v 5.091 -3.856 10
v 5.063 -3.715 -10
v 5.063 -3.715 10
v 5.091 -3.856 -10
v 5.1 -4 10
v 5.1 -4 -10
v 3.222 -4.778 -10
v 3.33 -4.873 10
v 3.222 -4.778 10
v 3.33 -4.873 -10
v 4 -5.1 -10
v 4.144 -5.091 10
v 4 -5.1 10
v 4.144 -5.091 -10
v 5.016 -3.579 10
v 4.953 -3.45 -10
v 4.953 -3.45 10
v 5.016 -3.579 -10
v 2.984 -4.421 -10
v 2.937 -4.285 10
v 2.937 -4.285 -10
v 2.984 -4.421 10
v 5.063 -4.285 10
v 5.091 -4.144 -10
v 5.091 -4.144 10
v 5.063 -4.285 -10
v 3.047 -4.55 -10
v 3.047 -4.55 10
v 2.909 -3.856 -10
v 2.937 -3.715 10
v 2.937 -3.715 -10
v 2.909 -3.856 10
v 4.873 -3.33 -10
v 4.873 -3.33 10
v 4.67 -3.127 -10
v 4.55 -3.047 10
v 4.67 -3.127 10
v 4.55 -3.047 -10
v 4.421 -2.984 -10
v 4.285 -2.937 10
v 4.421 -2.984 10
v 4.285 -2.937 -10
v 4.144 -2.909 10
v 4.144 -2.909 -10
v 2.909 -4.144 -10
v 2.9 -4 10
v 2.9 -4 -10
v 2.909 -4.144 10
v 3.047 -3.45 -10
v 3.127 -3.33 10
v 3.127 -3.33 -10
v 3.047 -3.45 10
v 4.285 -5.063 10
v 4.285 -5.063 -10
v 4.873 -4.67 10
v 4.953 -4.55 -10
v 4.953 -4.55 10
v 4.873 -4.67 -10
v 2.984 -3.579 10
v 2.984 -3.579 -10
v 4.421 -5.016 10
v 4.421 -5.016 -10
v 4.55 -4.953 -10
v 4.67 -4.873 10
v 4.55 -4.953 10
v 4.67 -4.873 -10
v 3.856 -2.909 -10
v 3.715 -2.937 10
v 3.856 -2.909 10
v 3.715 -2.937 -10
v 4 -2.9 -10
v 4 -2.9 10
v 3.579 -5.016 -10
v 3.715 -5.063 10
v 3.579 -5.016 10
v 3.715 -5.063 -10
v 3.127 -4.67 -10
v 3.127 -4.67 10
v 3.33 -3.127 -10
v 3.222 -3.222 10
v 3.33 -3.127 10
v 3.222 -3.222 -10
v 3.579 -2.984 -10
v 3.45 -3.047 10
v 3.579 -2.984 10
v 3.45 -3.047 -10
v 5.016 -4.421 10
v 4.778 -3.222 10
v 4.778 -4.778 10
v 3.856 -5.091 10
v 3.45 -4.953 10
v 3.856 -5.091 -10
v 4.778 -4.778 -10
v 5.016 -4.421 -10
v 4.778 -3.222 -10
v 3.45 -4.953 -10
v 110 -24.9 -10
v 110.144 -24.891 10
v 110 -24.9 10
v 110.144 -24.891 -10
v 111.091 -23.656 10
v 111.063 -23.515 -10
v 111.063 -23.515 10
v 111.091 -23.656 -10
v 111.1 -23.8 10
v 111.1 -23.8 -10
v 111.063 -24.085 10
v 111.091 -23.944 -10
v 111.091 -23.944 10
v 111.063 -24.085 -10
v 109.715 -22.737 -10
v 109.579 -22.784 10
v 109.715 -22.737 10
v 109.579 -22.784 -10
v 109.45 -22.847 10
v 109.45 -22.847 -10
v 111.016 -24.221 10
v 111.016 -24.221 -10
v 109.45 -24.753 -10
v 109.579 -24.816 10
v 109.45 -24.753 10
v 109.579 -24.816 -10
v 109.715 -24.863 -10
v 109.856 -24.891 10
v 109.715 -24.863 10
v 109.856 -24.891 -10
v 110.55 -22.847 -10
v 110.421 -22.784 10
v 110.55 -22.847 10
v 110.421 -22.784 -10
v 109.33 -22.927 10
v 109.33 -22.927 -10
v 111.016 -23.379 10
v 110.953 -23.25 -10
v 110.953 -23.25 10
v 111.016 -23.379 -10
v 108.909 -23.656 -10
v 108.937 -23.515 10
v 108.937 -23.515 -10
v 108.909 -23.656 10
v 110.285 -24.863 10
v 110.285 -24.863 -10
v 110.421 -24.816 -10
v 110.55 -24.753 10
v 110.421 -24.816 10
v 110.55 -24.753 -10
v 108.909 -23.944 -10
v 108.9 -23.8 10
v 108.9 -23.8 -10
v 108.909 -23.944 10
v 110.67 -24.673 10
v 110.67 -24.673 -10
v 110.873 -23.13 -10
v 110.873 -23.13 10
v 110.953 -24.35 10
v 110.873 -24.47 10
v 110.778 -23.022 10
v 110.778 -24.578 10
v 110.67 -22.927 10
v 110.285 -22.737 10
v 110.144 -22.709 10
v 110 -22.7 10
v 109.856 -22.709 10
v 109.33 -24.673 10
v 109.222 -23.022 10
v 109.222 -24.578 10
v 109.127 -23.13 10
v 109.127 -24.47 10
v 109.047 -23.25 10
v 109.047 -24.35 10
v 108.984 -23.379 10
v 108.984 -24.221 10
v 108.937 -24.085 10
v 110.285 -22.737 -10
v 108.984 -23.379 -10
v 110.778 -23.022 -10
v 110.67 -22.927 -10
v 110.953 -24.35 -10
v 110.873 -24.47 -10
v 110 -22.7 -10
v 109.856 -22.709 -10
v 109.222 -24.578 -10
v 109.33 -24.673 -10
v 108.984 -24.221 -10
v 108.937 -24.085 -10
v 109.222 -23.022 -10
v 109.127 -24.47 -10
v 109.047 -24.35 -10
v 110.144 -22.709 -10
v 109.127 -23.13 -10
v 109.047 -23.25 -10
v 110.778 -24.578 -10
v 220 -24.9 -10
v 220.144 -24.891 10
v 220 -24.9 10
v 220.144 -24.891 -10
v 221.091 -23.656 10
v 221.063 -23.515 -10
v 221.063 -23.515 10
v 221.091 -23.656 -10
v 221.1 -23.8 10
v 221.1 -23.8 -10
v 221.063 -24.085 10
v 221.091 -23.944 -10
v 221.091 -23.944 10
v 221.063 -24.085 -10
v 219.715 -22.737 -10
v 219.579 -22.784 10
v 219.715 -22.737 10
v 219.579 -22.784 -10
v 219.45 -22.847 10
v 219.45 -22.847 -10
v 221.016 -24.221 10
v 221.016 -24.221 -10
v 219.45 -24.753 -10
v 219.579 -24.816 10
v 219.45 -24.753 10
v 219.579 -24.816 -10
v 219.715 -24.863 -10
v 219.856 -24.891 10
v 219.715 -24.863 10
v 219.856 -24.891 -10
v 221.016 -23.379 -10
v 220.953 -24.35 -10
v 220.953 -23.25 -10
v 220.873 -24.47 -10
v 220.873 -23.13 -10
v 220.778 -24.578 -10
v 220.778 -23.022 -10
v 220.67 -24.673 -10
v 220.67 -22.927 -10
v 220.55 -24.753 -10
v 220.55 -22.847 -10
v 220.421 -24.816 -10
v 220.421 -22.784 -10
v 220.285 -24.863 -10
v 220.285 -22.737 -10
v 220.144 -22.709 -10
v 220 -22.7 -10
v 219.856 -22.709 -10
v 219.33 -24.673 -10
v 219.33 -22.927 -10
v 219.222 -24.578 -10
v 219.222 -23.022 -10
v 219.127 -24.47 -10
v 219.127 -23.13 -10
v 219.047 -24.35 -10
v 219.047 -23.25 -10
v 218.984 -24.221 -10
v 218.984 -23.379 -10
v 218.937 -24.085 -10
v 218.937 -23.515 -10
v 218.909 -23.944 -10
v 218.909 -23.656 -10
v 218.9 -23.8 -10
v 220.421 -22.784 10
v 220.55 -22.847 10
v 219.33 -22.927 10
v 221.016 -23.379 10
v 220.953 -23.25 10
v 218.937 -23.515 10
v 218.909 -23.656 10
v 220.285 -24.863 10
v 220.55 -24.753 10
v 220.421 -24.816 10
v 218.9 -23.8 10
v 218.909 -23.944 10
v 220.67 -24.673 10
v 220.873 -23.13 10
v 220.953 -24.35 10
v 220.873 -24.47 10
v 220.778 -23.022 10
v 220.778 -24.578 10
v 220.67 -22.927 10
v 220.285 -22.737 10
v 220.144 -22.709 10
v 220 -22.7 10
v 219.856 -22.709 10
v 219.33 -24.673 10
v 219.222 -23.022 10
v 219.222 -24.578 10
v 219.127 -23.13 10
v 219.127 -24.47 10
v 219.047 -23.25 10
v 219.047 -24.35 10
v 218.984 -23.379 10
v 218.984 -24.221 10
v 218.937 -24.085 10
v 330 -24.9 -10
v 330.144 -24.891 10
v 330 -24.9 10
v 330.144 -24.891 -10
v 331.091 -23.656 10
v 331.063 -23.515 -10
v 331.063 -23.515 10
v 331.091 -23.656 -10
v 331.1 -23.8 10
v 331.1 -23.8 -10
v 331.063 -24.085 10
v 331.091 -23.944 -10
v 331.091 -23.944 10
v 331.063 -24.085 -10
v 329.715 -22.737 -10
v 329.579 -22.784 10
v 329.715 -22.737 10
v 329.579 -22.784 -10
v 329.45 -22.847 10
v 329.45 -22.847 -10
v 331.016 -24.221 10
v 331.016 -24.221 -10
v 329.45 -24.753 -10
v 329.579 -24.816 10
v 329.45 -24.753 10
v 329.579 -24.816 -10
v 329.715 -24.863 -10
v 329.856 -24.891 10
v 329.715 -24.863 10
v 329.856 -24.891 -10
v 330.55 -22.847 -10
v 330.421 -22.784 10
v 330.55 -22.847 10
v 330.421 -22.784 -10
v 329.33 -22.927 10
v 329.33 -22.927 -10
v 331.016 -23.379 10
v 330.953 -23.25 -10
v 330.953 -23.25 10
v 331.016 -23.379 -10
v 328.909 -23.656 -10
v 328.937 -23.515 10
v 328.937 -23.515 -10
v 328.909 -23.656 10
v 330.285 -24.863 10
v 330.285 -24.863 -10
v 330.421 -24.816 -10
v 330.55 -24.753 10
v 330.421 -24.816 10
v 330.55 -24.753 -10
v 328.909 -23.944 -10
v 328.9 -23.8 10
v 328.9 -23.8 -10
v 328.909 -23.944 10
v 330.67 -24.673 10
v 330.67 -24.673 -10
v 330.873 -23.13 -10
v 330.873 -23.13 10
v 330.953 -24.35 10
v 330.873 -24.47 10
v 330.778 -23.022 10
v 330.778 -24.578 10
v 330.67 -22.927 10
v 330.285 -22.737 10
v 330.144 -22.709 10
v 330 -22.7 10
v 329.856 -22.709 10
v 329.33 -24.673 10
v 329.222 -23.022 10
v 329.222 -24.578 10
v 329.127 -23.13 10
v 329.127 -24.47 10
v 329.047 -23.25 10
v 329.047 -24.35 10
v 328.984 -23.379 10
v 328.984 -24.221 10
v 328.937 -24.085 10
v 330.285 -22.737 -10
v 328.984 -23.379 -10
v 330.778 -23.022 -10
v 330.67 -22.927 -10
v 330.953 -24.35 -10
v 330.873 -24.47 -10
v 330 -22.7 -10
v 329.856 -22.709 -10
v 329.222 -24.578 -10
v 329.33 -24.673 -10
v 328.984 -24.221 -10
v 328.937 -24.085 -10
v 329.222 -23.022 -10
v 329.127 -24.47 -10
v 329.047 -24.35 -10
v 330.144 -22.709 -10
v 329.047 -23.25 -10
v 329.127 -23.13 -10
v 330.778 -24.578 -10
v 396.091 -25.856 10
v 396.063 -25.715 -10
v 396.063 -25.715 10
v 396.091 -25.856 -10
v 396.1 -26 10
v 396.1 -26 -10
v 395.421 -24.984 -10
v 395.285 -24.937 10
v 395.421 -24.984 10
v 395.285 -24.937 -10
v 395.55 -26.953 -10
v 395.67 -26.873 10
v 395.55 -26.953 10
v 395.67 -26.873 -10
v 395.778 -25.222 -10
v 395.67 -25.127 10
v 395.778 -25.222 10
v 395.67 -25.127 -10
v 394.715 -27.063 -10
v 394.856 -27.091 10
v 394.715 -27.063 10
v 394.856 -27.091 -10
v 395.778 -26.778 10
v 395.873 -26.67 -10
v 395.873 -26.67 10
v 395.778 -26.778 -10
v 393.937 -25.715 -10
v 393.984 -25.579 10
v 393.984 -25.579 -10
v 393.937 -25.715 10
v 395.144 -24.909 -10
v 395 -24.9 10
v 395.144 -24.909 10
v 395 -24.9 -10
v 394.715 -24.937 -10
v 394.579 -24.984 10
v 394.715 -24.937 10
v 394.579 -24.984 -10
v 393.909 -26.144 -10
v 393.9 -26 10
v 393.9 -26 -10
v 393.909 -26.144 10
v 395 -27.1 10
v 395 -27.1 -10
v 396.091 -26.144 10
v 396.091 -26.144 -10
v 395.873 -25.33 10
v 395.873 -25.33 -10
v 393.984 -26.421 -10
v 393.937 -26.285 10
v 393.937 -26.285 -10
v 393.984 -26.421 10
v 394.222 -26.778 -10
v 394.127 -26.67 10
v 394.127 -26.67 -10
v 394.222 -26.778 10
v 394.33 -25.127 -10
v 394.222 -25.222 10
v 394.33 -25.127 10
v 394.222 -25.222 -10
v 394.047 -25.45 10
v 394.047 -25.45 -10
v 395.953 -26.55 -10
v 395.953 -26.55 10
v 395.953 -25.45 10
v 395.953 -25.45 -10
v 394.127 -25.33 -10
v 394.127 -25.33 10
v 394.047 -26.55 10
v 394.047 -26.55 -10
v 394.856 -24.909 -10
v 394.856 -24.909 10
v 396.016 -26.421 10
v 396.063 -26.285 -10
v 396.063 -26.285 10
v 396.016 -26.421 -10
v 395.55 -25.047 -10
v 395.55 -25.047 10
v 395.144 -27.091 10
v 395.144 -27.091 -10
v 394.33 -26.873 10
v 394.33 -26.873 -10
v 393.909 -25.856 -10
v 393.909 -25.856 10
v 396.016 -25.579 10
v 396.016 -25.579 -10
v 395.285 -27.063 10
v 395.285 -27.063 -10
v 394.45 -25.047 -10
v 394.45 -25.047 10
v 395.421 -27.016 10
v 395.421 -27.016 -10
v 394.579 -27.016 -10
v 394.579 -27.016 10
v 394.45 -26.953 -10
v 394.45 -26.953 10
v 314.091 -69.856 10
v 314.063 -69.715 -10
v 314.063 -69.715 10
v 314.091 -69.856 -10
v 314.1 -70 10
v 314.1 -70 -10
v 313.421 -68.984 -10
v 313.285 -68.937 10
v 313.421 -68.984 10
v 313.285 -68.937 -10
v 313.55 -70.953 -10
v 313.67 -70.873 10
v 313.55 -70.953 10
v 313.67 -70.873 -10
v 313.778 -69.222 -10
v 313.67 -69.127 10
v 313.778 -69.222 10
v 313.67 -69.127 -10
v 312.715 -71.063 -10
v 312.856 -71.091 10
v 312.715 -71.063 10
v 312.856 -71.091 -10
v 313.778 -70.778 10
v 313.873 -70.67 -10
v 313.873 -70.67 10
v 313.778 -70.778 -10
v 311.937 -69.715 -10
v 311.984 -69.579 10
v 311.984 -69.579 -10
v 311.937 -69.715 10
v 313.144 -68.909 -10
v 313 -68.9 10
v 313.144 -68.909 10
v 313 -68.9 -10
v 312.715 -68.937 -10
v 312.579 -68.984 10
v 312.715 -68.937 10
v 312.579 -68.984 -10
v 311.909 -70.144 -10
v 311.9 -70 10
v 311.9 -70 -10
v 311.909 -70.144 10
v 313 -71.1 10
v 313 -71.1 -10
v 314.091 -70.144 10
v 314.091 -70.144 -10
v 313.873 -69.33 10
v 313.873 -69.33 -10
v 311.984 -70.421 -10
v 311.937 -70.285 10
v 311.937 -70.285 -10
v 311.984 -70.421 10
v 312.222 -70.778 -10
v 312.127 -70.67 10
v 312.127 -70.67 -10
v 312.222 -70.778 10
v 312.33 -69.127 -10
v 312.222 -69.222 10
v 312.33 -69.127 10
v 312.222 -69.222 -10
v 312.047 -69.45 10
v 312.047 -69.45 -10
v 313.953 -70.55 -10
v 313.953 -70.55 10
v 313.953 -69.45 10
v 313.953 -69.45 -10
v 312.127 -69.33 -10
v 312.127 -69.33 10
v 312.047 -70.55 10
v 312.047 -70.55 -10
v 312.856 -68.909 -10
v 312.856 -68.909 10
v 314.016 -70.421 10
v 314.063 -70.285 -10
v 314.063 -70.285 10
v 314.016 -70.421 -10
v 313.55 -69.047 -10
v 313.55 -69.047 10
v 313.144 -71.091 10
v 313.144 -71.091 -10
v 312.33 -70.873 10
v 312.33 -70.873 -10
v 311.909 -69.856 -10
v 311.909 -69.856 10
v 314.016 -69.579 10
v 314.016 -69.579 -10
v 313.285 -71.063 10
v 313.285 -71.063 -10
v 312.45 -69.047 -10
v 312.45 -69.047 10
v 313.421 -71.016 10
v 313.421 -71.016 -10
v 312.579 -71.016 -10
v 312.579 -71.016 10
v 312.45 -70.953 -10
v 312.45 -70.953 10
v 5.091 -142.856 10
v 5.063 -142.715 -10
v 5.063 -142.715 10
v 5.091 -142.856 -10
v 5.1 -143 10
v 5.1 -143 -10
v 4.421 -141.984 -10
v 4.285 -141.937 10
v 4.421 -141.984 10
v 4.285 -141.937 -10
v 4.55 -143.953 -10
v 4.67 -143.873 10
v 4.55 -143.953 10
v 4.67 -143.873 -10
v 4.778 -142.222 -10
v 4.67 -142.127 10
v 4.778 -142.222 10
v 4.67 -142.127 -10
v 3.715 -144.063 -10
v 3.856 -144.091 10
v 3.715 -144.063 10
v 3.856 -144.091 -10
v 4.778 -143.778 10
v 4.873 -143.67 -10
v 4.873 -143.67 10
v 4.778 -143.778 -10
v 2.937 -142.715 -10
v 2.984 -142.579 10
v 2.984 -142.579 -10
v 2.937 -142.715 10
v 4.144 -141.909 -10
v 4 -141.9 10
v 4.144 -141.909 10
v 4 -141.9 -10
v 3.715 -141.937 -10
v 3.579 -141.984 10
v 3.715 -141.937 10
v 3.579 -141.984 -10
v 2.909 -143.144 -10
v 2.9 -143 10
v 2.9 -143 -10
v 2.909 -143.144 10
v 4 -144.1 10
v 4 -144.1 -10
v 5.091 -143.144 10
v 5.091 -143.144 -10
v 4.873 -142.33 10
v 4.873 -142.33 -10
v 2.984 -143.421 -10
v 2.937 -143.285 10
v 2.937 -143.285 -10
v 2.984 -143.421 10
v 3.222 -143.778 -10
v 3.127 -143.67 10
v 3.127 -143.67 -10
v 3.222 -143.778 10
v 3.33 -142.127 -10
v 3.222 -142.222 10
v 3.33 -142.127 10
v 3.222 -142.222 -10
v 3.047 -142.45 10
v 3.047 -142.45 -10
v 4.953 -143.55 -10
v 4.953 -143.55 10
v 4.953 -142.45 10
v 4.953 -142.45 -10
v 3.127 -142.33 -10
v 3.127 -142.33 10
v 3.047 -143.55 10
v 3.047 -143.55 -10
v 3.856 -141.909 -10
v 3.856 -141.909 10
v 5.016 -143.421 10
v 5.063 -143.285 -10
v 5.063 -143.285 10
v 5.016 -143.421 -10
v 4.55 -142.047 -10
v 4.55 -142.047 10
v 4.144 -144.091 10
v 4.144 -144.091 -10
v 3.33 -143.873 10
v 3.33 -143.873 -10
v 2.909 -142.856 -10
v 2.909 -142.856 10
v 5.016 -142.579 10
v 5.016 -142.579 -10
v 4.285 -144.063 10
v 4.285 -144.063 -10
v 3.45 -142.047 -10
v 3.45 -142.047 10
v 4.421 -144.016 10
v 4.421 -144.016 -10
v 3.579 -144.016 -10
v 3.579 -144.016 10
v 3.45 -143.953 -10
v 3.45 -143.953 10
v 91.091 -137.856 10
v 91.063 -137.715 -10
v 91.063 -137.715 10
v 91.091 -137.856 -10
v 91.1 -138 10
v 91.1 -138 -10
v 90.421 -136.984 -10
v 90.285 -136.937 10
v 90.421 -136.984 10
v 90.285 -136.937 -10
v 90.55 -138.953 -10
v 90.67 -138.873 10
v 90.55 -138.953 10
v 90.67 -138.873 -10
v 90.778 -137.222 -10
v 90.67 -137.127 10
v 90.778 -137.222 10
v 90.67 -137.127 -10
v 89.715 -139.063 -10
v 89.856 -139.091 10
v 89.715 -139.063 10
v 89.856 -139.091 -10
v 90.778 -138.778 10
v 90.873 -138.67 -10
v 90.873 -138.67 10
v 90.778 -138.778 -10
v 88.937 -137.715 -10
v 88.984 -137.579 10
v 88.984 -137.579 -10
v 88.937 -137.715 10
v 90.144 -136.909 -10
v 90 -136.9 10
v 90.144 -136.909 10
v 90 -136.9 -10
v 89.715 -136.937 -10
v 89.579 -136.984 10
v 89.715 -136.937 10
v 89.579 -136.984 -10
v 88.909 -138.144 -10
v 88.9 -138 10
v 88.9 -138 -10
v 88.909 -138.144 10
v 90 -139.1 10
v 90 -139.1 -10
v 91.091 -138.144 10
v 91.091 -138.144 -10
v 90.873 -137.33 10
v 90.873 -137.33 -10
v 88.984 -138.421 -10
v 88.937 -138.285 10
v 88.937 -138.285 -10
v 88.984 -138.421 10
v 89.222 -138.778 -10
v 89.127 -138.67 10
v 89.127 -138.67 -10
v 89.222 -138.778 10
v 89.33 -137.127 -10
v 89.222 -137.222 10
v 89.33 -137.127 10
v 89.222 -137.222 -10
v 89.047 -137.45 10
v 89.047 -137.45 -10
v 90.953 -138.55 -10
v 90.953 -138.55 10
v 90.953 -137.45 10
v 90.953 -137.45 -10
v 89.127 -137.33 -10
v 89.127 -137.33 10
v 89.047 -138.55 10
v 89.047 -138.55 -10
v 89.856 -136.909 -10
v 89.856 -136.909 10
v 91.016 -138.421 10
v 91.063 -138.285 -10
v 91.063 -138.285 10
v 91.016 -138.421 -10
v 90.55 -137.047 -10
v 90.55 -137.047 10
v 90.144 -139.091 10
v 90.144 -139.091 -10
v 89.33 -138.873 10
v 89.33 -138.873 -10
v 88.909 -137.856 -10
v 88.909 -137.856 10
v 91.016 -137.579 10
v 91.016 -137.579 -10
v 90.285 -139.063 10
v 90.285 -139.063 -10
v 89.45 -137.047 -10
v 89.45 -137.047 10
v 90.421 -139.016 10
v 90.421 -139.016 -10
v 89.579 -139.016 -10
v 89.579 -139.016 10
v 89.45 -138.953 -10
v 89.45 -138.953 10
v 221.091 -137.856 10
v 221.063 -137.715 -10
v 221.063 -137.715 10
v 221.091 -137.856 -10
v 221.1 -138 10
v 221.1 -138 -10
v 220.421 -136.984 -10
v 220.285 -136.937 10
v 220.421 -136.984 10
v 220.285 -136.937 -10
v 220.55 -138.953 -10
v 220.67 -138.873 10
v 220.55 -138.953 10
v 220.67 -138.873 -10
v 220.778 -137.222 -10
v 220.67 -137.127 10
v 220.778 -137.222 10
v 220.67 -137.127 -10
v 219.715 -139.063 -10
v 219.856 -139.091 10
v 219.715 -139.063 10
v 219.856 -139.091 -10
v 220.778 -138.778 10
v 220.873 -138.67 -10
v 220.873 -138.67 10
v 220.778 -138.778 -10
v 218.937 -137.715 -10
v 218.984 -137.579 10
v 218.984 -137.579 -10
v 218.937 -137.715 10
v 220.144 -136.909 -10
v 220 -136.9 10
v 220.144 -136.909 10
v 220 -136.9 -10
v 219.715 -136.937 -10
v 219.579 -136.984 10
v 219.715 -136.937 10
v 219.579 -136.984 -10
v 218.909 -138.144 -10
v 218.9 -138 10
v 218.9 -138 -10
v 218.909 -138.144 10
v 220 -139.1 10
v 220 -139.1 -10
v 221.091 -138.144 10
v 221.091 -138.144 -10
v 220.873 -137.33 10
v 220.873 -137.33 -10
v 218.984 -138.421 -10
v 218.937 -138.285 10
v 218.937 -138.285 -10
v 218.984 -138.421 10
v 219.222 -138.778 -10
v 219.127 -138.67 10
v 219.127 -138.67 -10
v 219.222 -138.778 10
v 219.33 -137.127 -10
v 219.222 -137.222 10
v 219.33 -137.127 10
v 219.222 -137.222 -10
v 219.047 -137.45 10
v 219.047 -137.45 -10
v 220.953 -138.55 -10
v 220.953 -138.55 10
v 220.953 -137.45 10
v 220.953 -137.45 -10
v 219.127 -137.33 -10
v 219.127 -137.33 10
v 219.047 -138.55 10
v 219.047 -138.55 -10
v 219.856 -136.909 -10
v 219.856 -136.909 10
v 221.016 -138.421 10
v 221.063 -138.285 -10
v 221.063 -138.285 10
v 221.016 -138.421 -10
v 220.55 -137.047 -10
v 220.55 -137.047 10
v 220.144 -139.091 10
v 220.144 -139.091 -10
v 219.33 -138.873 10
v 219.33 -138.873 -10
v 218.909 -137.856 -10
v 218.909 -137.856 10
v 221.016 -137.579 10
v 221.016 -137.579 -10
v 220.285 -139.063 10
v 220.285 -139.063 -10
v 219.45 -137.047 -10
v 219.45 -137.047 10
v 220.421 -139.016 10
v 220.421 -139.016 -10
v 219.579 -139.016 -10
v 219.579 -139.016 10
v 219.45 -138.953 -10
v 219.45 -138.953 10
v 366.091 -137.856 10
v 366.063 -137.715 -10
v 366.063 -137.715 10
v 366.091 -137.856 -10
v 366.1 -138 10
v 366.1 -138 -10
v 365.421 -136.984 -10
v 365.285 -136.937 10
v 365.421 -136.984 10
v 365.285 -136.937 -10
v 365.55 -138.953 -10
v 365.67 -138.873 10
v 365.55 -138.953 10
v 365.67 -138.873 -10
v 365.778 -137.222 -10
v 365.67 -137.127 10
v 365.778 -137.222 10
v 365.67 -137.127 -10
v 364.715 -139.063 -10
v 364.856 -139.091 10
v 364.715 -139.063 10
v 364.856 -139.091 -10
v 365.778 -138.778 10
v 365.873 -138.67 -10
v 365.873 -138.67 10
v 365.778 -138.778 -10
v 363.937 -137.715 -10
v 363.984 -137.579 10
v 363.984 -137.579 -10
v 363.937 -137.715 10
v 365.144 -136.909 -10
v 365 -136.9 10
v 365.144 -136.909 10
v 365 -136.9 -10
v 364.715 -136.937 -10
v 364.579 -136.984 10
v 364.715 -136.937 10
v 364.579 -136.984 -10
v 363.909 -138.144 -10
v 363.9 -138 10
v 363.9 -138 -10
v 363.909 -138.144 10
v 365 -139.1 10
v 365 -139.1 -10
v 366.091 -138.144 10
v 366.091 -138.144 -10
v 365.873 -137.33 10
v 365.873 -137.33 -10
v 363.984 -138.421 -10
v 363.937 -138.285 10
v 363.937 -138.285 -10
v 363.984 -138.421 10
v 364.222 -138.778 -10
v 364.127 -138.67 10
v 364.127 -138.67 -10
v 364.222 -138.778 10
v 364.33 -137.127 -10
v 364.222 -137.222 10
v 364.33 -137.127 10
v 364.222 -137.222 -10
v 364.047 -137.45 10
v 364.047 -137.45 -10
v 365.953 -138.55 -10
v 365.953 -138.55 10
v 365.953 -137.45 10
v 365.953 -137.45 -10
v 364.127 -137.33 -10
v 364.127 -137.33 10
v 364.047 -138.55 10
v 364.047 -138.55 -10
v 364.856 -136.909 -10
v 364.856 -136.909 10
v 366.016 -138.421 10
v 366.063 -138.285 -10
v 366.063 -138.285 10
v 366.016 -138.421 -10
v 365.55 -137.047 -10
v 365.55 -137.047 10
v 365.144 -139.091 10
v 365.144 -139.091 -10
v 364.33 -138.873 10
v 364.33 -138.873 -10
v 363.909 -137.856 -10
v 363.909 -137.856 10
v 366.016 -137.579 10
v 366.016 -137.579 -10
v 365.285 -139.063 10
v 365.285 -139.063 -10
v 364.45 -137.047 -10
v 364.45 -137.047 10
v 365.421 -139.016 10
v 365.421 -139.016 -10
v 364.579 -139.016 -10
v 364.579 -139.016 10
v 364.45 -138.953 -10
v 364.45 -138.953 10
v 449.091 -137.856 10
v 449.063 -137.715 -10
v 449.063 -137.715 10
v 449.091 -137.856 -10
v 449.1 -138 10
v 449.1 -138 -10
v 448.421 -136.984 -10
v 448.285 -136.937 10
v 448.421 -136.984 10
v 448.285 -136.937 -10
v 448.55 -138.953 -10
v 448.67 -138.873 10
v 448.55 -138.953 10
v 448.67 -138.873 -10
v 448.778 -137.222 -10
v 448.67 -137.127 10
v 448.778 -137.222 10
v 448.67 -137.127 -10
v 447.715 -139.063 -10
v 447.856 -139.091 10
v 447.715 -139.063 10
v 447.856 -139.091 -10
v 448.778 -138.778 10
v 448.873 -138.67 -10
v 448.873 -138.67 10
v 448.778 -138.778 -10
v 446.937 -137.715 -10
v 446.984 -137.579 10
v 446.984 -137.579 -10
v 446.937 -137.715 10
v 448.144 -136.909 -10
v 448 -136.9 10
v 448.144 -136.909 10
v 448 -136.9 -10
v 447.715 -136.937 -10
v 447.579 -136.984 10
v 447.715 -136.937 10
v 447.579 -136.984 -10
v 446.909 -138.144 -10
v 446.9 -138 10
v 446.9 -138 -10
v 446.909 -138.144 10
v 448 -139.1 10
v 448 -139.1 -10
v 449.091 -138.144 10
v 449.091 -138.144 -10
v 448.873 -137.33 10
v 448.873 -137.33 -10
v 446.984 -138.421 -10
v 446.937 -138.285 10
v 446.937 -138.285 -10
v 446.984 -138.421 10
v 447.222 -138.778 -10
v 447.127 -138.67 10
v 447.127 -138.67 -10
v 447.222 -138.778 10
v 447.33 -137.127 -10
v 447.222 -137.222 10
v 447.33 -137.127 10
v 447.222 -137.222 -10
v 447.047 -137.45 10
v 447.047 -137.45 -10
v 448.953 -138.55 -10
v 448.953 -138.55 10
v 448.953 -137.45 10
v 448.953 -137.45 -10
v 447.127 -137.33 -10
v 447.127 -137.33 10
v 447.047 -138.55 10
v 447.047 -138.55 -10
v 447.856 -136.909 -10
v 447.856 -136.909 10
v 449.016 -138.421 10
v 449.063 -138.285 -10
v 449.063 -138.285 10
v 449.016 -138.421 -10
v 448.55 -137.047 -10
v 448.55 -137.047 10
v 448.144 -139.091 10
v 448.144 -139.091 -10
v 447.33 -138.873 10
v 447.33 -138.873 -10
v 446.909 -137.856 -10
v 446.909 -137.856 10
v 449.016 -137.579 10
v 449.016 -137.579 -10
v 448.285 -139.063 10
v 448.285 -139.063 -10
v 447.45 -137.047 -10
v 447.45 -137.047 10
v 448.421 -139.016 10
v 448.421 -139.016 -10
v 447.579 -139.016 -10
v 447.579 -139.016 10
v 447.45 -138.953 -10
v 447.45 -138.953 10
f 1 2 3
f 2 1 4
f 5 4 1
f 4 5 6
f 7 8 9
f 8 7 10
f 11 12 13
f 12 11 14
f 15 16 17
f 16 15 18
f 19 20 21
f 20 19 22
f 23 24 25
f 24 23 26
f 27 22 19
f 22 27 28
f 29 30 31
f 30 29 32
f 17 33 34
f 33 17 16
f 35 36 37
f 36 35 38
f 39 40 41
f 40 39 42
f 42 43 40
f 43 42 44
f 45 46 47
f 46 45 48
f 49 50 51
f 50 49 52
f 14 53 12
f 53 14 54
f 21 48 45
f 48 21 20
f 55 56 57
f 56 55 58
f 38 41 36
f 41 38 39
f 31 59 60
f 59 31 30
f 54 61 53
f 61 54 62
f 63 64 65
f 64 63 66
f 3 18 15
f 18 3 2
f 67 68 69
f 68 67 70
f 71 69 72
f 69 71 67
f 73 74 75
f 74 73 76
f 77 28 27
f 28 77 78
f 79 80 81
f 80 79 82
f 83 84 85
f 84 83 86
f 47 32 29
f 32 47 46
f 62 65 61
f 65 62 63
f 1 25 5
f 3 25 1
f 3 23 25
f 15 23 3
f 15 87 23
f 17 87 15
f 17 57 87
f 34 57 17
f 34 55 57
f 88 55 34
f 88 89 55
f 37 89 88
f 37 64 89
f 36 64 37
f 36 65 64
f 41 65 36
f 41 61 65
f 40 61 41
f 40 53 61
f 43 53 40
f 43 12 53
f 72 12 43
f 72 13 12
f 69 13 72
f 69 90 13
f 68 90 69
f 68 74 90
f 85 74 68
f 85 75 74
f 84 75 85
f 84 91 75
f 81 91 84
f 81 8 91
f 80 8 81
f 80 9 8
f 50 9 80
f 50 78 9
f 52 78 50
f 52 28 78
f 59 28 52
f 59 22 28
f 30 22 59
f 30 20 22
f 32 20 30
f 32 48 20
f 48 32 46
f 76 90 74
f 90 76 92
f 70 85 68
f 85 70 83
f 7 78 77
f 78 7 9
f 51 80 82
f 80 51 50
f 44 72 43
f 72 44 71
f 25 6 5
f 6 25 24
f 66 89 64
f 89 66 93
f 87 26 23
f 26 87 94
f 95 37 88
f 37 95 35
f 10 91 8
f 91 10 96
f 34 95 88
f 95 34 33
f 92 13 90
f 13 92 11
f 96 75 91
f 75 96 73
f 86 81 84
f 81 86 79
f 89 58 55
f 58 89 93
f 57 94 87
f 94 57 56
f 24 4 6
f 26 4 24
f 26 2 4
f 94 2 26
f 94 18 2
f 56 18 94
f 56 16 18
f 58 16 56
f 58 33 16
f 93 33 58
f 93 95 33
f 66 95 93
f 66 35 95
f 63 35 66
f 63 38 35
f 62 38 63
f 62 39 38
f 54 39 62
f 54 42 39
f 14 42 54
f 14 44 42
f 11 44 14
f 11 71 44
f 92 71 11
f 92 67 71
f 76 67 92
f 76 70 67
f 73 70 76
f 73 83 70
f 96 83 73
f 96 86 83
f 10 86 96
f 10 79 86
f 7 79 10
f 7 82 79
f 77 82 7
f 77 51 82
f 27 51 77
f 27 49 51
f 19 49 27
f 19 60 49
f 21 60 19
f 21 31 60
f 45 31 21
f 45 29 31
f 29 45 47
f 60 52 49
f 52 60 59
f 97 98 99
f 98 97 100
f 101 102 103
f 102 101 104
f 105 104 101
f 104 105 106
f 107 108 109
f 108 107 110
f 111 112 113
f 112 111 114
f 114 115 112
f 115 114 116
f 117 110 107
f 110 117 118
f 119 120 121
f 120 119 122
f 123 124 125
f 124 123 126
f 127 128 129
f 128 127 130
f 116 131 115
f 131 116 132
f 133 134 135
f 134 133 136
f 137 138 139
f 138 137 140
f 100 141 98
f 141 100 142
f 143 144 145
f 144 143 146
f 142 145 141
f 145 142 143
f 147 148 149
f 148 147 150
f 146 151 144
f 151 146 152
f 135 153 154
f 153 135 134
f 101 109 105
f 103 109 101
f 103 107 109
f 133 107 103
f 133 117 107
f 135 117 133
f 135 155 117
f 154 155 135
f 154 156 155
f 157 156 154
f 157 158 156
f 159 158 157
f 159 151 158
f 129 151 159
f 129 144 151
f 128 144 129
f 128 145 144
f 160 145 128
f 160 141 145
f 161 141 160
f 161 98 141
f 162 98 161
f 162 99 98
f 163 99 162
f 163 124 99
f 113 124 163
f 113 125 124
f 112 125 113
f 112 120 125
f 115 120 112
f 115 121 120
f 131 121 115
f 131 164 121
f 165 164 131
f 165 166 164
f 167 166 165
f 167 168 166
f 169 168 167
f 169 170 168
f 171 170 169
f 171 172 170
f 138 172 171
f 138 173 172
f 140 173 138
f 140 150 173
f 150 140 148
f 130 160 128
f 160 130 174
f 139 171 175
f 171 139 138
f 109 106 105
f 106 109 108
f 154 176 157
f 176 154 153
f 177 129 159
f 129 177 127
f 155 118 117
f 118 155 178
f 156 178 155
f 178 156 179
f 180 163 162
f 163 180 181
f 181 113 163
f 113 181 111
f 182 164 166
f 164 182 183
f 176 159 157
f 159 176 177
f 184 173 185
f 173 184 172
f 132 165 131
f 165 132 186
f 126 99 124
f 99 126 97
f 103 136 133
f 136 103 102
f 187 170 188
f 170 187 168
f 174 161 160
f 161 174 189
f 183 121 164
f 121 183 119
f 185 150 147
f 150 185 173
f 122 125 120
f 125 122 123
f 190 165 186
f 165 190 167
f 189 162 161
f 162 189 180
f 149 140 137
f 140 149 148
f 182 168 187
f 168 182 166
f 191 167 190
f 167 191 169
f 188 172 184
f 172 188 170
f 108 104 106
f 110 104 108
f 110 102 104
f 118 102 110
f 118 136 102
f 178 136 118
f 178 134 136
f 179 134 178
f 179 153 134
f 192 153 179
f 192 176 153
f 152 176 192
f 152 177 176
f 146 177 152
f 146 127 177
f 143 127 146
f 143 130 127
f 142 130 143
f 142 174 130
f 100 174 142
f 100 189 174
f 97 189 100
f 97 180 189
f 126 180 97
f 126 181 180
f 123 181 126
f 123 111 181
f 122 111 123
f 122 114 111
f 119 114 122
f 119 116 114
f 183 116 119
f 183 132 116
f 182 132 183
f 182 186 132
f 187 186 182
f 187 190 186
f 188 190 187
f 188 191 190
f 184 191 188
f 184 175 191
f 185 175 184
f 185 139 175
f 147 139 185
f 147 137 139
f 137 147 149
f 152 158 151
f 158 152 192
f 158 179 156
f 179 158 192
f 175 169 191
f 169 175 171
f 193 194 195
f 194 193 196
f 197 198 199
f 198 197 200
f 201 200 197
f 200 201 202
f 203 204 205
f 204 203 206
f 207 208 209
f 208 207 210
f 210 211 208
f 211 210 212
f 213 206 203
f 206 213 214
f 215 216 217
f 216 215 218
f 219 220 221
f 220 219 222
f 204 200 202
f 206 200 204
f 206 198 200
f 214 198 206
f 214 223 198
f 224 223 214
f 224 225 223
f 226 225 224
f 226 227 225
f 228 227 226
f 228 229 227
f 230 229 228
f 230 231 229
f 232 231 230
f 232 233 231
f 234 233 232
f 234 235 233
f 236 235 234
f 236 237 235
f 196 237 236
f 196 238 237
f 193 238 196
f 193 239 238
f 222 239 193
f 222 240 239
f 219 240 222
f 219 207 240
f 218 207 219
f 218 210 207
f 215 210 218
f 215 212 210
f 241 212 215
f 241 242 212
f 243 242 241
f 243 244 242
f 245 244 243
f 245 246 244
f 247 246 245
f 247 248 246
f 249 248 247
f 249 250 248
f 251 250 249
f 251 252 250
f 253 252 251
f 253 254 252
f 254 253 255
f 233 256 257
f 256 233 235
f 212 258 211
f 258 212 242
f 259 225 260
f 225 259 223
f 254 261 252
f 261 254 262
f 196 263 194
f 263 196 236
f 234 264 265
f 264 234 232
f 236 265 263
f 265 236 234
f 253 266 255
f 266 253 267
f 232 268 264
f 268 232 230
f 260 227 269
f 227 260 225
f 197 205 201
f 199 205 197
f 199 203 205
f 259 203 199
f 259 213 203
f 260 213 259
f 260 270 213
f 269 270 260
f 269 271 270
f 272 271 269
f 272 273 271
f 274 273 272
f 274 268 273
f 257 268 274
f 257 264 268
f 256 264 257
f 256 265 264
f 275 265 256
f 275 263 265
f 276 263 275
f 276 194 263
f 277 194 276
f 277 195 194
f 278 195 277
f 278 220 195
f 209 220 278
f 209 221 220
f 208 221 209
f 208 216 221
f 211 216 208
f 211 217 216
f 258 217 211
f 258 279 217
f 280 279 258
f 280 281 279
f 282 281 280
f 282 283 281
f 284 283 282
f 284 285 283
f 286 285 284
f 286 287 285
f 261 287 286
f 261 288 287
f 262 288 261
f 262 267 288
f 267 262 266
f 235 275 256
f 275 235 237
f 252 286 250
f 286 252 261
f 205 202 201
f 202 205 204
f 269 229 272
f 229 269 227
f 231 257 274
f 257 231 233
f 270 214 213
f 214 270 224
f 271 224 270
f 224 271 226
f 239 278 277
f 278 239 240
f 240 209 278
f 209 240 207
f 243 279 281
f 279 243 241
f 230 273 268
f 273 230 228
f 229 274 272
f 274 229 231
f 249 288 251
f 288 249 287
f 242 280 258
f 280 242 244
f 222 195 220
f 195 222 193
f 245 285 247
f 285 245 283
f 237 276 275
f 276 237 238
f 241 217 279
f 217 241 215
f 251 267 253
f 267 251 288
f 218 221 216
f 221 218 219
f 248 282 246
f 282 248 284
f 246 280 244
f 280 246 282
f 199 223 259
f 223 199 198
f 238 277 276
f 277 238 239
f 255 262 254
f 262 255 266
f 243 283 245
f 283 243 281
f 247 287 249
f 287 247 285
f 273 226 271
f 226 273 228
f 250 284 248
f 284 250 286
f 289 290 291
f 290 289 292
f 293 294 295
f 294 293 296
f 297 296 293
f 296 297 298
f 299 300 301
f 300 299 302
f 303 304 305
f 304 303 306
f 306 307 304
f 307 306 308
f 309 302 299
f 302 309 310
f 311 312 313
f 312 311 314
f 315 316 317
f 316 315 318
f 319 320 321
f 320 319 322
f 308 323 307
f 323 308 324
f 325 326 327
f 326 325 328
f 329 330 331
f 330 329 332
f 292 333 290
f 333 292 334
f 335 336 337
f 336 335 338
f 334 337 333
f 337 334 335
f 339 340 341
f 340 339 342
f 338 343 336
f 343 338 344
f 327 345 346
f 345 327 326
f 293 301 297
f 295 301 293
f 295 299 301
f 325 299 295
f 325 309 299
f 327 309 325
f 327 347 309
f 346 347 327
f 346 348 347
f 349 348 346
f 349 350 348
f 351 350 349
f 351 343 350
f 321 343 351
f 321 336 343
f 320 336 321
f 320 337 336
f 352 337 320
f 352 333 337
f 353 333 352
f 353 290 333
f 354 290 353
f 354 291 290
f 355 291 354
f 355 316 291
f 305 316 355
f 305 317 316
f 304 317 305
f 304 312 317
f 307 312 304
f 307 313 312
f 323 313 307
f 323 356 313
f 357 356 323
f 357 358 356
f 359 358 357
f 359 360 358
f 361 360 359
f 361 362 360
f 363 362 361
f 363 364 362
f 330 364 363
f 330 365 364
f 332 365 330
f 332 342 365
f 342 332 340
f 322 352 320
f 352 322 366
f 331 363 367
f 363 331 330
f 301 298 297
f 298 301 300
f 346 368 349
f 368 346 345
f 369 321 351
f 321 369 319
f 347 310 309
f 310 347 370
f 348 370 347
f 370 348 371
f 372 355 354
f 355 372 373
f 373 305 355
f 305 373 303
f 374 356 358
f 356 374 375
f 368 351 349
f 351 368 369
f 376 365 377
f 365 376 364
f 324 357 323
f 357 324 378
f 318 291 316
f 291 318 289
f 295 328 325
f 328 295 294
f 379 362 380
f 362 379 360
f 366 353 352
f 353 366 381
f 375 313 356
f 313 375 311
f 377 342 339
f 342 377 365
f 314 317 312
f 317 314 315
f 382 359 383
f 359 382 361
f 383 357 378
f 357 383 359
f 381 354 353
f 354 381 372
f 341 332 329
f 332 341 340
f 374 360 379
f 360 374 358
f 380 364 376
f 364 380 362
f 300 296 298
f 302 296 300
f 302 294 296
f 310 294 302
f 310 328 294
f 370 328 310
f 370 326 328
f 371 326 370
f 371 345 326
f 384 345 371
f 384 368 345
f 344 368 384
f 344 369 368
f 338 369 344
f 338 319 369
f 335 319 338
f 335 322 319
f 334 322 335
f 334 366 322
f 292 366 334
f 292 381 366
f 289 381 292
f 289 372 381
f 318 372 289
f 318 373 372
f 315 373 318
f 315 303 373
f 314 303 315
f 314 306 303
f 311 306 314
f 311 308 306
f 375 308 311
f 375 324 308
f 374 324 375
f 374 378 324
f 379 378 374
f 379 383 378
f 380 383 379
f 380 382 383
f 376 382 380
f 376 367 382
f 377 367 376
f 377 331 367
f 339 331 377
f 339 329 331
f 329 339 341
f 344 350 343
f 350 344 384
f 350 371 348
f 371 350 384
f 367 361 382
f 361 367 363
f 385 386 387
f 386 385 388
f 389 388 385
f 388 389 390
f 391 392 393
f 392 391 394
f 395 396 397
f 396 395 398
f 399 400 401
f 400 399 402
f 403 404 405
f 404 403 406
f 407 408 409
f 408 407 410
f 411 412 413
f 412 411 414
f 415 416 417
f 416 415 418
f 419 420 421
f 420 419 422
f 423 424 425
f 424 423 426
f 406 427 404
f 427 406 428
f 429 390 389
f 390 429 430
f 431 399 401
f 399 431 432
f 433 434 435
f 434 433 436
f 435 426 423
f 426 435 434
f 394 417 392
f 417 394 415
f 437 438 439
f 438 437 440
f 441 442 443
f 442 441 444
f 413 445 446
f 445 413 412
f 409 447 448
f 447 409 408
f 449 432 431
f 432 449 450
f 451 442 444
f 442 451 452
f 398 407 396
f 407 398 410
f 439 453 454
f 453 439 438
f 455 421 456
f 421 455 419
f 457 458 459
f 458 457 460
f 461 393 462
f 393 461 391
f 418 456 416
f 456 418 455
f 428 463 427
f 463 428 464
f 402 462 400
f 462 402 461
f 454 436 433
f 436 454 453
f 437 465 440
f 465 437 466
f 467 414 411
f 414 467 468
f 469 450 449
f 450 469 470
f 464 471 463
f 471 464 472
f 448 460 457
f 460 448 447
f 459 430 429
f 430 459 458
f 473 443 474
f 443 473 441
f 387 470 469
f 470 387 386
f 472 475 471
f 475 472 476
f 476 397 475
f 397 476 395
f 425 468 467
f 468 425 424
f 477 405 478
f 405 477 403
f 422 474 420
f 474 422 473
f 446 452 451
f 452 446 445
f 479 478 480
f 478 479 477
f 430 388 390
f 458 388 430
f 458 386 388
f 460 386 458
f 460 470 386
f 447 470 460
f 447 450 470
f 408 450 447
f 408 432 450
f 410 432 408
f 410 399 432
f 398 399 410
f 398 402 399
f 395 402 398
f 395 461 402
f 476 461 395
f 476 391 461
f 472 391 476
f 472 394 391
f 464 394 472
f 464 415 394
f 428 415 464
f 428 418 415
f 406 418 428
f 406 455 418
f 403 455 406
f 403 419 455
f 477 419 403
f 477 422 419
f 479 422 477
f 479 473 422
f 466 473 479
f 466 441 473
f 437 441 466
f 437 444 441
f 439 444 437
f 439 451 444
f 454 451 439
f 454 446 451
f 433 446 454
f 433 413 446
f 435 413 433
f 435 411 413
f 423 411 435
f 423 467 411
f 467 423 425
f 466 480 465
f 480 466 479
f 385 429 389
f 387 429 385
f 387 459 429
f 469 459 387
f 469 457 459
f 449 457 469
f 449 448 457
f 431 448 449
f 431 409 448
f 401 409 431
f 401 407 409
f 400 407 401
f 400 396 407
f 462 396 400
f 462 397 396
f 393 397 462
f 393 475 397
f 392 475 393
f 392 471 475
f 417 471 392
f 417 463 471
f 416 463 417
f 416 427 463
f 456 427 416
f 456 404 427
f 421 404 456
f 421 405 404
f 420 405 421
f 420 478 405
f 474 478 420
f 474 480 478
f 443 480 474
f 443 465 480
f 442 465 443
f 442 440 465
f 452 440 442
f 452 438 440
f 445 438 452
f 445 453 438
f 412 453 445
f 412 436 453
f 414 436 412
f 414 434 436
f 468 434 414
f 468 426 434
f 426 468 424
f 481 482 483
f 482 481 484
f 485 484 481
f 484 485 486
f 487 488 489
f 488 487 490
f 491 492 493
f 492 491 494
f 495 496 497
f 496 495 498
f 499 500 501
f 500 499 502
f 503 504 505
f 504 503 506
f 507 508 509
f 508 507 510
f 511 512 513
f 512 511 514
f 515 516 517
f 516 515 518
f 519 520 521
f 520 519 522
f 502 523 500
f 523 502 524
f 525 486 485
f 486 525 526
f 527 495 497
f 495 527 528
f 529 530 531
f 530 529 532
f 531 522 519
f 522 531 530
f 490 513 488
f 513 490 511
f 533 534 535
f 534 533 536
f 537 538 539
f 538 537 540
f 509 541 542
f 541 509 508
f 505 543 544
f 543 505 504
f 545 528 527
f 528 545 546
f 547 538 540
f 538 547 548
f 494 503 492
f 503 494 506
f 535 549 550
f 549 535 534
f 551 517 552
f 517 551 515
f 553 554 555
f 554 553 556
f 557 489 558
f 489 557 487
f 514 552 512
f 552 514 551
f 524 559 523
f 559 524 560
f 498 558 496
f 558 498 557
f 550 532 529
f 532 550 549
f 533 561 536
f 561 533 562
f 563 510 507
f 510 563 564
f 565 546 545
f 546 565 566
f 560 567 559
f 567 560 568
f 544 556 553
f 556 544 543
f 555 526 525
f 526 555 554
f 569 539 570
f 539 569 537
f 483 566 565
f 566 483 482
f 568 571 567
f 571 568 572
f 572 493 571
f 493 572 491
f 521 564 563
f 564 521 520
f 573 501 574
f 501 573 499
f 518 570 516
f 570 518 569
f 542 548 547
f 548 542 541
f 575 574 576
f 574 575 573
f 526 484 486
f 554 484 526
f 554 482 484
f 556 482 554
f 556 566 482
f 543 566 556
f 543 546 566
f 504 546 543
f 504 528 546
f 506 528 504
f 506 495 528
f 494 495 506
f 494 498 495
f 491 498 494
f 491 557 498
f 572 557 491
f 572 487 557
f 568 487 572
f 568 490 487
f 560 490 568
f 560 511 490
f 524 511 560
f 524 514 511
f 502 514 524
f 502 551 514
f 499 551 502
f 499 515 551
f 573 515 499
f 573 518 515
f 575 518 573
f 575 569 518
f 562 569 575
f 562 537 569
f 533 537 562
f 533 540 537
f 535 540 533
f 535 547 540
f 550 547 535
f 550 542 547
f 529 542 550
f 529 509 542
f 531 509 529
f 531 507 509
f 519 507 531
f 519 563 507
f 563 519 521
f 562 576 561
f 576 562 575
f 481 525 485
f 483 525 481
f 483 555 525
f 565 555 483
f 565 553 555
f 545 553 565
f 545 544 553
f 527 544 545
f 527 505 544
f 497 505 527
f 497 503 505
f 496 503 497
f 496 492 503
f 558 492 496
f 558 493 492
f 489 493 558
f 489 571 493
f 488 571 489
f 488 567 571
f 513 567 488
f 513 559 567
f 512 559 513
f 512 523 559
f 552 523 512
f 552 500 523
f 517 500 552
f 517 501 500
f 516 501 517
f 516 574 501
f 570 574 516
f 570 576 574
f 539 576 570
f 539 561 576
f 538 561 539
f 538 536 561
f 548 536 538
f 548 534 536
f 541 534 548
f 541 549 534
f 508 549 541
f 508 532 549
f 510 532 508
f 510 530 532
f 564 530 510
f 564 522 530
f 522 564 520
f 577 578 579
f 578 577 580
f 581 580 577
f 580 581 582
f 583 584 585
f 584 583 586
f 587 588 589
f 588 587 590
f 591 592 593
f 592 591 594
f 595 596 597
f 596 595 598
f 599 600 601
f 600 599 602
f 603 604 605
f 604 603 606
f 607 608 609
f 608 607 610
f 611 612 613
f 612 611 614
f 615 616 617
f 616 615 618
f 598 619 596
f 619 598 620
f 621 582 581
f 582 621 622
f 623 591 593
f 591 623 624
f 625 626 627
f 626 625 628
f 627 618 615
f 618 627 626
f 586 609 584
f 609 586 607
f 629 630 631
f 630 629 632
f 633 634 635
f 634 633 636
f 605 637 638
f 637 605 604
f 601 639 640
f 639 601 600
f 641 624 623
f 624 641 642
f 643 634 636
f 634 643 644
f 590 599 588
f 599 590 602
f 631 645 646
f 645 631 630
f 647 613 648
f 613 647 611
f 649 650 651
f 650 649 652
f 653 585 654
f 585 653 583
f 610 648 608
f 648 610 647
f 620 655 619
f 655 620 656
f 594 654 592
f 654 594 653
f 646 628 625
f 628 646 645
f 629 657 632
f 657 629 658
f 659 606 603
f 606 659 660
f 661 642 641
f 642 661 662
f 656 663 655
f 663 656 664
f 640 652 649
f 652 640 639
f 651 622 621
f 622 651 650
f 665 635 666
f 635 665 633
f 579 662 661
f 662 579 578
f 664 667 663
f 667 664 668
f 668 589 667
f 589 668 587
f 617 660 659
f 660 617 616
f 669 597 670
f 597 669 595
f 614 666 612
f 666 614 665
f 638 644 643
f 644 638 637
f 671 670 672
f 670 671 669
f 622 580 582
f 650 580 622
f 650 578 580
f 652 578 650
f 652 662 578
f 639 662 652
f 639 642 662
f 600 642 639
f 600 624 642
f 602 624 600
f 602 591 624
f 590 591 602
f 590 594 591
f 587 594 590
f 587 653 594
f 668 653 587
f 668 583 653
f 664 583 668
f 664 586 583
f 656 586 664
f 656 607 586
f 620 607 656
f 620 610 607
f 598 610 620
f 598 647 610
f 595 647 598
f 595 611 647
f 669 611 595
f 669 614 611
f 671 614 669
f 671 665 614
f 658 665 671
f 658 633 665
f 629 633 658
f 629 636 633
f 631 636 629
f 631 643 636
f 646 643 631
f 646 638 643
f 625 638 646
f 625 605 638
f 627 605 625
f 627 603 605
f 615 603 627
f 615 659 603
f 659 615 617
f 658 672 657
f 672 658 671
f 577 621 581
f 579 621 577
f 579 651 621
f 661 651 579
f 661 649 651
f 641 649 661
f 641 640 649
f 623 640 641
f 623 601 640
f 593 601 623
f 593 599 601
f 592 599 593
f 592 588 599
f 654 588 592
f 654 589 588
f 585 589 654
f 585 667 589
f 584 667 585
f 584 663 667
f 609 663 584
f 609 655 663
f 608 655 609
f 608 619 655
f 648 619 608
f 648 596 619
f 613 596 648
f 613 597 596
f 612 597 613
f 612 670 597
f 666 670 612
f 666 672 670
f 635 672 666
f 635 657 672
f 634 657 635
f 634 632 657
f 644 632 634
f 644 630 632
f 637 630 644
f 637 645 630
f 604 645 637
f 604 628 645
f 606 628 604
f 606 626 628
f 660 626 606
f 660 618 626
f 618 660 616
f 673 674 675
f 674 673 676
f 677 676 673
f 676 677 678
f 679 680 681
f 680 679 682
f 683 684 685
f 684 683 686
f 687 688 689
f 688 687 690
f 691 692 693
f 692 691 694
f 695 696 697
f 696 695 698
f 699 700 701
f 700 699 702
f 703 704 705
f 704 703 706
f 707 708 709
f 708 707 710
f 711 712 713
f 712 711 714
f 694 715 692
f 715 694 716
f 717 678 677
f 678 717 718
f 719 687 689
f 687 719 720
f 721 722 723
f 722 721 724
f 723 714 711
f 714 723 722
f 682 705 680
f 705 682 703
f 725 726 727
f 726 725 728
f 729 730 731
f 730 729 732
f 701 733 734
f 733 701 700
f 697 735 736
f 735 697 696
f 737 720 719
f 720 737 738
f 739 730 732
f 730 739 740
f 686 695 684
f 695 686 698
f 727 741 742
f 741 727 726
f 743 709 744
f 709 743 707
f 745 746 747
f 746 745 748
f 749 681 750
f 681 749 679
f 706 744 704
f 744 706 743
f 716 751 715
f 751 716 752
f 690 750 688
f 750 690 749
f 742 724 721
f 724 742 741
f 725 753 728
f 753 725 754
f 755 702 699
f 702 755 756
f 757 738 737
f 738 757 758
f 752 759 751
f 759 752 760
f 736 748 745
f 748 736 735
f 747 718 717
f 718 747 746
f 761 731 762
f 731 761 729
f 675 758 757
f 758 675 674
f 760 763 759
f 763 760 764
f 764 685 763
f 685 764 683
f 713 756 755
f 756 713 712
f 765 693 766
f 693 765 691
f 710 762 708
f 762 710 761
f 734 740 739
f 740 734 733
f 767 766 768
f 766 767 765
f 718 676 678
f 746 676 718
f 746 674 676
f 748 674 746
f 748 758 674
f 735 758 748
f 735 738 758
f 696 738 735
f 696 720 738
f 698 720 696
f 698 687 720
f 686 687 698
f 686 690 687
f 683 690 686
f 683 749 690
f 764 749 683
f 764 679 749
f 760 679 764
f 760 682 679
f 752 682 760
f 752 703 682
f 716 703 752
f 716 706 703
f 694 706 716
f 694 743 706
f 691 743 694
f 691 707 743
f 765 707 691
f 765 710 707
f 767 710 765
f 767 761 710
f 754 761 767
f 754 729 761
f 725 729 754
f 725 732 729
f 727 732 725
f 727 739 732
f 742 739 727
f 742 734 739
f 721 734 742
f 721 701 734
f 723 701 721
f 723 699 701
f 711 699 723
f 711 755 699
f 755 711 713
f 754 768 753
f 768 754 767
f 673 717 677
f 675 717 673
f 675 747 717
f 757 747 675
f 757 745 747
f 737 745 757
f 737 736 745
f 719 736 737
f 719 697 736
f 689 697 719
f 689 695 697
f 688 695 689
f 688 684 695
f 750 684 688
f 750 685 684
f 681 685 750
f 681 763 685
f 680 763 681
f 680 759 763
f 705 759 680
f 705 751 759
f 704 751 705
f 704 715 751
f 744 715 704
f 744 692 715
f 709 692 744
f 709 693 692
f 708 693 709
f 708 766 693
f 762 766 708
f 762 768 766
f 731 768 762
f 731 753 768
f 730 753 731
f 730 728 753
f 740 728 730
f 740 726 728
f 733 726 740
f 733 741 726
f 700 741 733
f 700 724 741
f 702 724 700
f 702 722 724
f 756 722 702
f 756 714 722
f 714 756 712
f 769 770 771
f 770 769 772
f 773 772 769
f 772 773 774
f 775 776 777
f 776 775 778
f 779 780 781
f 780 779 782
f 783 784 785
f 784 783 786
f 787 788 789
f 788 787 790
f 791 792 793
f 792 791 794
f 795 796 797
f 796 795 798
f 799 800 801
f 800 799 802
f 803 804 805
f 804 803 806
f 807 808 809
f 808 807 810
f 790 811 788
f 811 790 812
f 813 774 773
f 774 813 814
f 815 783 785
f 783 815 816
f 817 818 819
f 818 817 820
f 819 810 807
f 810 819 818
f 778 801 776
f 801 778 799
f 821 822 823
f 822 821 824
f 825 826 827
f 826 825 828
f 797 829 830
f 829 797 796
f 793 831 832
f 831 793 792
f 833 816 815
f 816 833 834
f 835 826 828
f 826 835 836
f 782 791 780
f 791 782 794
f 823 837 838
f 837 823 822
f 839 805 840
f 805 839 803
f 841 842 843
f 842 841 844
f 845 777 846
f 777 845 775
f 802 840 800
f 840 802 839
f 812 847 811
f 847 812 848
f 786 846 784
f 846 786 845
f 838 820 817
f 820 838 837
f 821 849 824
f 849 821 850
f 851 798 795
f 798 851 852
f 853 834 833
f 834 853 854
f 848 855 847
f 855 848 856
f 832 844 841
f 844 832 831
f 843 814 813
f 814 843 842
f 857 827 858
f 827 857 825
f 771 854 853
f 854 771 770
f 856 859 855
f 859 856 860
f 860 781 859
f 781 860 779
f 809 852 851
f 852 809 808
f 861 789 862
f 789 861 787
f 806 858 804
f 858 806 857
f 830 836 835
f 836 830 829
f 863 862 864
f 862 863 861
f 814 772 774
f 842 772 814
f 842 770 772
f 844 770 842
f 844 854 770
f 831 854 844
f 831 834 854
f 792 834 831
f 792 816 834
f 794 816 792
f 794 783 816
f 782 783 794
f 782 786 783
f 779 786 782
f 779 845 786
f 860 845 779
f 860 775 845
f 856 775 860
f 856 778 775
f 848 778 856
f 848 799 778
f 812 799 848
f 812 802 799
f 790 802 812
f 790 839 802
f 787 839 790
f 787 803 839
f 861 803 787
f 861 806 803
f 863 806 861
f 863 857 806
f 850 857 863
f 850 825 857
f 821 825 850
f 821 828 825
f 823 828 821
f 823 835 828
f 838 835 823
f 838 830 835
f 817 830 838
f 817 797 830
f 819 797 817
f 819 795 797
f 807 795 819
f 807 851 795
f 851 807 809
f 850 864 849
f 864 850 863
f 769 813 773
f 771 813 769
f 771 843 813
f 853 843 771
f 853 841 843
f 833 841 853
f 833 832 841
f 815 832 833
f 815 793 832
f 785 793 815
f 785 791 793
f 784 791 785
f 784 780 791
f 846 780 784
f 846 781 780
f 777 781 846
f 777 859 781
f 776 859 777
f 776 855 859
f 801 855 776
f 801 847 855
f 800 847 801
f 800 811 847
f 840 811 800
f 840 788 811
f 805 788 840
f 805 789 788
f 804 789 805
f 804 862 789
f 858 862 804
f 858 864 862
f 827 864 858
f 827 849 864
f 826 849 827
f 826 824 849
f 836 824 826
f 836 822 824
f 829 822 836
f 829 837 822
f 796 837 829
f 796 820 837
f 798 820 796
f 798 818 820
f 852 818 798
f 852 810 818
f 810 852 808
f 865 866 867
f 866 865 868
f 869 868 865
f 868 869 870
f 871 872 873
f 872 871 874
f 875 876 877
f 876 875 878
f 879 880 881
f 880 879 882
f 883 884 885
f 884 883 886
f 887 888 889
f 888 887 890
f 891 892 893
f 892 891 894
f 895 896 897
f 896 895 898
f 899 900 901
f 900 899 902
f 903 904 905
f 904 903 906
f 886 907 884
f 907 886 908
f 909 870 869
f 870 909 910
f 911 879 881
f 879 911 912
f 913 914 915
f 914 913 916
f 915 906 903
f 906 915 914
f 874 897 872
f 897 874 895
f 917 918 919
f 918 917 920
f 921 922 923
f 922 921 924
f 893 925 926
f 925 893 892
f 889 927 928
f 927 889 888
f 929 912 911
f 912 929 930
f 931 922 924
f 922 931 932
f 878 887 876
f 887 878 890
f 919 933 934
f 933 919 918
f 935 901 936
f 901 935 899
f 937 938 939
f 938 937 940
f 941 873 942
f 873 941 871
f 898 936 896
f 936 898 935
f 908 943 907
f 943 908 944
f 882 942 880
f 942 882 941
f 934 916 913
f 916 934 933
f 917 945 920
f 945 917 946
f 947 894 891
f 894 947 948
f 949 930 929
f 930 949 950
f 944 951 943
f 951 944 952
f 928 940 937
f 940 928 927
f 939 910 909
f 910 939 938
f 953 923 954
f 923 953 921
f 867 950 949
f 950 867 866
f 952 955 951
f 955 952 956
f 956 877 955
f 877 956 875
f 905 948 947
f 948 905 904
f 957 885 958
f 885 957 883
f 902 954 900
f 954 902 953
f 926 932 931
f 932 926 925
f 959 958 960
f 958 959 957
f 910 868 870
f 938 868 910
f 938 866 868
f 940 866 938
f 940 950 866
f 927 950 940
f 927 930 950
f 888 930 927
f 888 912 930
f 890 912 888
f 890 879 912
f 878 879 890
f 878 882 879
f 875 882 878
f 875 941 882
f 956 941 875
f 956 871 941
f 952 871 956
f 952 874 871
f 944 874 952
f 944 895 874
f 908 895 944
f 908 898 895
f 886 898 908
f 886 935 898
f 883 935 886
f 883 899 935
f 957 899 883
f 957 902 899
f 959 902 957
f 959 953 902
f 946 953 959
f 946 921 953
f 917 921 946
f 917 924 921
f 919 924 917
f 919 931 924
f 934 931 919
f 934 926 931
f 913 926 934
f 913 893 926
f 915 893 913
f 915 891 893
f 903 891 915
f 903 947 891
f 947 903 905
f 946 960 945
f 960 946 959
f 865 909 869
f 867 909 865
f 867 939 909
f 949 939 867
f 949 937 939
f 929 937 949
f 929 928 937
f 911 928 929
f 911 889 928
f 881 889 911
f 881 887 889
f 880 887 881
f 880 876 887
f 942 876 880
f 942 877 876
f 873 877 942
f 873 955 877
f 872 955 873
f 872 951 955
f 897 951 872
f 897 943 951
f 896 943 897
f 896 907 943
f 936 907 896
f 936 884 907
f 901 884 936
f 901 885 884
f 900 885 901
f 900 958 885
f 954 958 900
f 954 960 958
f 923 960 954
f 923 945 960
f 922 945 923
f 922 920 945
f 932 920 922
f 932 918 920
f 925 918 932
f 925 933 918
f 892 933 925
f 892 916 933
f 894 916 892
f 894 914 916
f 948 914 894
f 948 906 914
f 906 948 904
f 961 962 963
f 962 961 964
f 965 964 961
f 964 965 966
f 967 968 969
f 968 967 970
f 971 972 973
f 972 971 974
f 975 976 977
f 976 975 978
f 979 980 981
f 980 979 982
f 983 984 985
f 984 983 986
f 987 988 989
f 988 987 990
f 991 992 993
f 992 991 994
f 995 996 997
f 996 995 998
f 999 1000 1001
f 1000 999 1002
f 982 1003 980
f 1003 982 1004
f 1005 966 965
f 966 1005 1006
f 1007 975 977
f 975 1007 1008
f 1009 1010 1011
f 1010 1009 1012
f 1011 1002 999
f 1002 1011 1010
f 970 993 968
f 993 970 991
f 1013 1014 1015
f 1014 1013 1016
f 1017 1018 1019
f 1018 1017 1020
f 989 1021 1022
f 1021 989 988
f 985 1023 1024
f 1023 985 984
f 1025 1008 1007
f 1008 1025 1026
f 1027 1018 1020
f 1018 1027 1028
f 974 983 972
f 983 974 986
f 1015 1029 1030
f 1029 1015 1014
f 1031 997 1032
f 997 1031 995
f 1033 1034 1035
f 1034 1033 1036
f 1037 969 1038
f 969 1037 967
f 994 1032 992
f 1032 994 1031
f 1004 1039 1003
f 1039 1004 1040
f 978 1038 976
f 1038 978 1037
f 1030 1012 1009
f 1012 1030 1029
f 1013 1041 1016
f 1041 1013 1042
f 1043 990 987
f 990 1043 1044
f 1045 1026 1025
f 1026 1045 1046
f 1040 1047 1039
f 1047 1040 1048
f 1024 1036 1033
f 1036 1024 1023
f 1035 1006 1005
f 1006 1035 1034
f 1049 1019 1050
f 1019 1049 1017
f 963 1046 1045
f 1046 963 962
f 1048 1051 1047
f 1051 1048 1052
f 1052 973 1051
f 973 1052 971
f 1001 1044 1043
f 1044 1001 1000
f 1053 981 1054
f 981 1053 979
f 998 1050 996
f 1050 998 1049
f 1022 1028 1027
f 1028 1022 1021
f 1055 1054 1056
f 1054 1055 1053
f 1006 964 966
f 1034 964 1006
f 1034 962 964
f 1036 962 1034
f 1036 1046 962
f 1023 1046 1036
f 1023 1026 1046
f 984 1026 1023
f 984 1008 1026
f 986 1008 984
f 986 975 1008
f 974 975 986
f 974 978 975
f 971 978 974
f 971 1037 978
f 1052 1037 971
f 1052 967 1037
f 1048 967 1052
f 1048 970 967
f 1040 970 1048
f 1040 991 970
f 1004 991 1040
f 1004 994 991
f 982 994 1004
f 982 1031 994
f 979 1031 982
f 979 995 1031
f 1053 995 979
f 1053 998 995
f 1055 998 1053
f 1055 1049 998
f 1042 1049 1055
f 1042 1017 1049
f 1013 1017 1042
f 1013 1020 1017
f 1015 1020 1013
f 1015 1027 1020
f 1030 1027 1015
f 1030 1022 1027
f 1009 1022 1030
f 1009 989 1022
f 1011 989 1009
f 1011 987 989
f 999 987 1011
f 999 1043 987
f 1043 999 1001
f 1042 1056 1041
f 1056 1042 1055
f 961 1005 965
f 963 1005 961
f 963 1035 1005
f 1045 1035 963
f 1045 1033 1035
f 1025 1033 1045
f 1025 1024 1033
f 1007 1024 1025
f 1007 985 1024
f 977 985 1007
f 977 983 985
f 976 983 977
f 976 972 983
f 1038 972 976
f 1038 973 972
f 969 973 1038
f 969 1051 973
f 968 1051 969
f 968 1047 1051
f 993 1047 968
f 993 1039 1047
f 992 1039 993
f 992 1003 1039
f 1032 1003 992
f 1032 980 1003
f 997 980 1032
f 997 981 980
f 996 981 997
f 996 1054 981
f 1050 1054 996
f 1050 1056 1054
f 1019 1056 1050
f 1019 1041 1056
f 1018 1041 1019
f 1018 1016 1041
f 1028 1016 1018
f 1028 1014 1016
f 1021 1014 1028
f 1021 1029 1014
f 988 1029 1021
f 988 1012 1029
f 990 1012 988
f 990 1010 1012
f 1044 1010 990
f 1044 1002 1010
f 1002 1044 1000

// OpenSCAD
// Import into your case design. PCB top is Z=0, bottom Z=-1.6.
// XY origin is upper-left; Y is negative toward the keyboard front.
pcb_size = [452.4375, 147.6375, 1.6];
mounts = [[4, -4], [110, -23.8], [220, -23.8], [330, -23.8], [395, -26], [313, -70], [4, -143], [90, -138], [220, -138], [365, -138], [448, -138]];
module mounting_axes(height=20) { for(p=mounts) translate([p[0],p[1],-10]) cylinder(d=2.2,h=height,$fn=48); }
module standoff_envelopes(height=3.5) { for(p=mounts) translate([p[0],p[1],0]) cylinder(d=6,h=height,$fn=48); }
mounting_axes();
